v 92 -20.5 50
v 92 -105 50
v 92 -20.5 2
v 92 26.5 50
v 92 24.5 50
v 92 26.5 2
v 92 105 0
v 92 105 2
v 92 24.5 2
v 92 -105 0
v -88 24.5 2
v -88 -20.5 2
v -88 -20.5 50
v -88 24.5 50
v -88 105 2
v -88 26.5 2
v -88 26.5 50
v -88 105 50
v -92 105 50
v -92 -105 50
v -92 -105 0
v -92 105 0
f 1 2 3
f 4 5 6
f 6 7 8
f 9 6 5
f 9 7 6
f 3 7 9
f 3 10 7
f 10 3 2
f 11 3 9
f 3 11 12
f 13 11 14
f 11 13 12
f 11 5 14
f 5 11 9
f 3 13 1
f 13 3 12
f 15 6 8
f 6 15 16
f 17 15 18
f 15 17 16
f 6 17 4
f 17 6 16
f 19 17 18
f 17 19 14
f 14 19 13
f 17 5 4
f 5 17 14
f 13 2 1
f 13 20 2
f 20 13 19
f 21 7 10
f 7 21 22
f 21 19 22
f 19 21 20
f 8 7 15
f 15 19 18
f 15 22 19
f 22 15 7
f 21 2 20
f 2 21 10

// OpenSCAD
// file: BOSL2/std.scad
// Minimal BOSL2 compatibility shim for bundled gallery models.
// It implements only the helpers used by the imported OpenSCAD projects.

CENTER = [0, 0, 0];
BOTTOM = [0, 0, -1];
TOP = [0, 0, 1];
LEFT = [-1, 0, 0];
RIGHT = [1, 0, 0];
FRONT = [0, -1, 0];
BACK = [0, 1, 0];

module up(z=0) {
    translate([0, 0, z]) children();
}

module down(z=0) {
    translate([0, 0, -z]) children();
}

module attach(anchor=CENTER) {
    children();
}

module cuboid(size=[1, 1, 1], anchor=CENTER) {
    center = anchor == CENTER;
    translate(center ? [0, 0, 0] : [0, 0, size[2] / 2])
        cube(size, center=true);
    children();
}

module xcyl(h=1, r=1, anchor=CENTER) {
    center = anchor == CENTER;
    translate(center ? [0, 0, 0] : [h / 2, 0, 0])
        rotate([0, 90, 0])
            cylinder(h=h, r=r, center=true);
}
// main file
//
// Glass Container Lid - Initial Boilerplate
//
// This file is intended for designing a lid compatible with the glass container rack system.
//

// The Belfry OpenScad Library, v2:  https://github.com/BelfrySCAD/BOSL2
include <BOSL2/std.scad>

// *** Model Parameters ***
/* [Model Parameters] */

// Overall width of the lid rack
lid_rack_width = 184;

// Overall depth of the lid rack
lid_rack_depth = 210;

// Overall height of the lid rack
lid_rack_height = 50;

// Thickness of the walls between compartments
wall_thickness = 2;

// Small lid cutout depth.  The remaining space will be split into two compartments for the large lids.
small_lid_cutout_depth = 112;

// *** "Private" variables ***
/* [Hidden] */

// Calculated Global Vars
cutout_width = lid_rack_width - (2 * wall_thickness);

// OpenSCAD System Settings
$fa = 1;
$fs = 0.4;

// Keeps the object in positive numbers on the axes; easier for my brain to comprehend when calculating offsets.
BASE_ANCHOR = BOTTOM+FRONT+LEFT;

corner_rounding = 2;

//
// small lid cutout is sideways and in the front.  We want to keep this static, and the remaining
// space broken into two compartments.
//
module small_lid_cutout () {
    x_offset = -((lid_rack_width - cutout_width) / 2) + (wall_thickness * 2);

    
    // Put this in the front of the rack
    y_offset = (lid_rack_depth - small_lid_cutout_depth) - wall_thickness;
    translate([x_offset, y_offset, wall_thickness]) {
        cuboid([cutout_width, small_lid_cutout_depth, lid_rack_height], anchor=BASE_ANCHOR);
    }
}

//
// Create two cutouts for the large lids, splitting the space evenly
//
module large_lid_cutouts() {
    remaining_depth = lid_rack_depth - small_lid_cutout_depth - (4 * wall_thickness);
    echo("Remaining Depth: ", remaining_depth);

    small_lid_y = ((lid_rack_depth - small_lid_cutout_depth) / 2) - wall_thickness;
    echo("Small Lid Y Offset: ", small_lid_y);

    // cutout depth
    large_lid_cutout_depth = remaining_depth / 2;
    echo("Large Lid Cutout Depth: ", large_lid_cutout_depth);

    x_offset = wall_thickness;

    for (i = [0, 1]) {
        y_offset = wall_thickness;

        translate ([x_offset, (large_lid_cutout_depth * i) + wall_thickness + (wall_thickness * i), wall_thickness]) {
            color("red") {
                cuboid([cutout_width, large_lid_cutout_depth, lid_rack_height], anchor=BASE_ANCHOR);
            }
        }
     
    }
}

//
// Create the entire glass container lid rack body
//
module glass_container_lid_body() {
    cuboid([lid_rack_width, lid_rack_depth, lid_rack_height], anchor=BASE_ANCHOR, rounding=corner_rounding, 
        except=[BOTTOM]);
}

//
// Builds the entire model
//
module build_model() {
    difference() {
        glass_container_lid_body();

        small_lid_cutout();
        large_lid_cutouts();
    }
}

build_model();
